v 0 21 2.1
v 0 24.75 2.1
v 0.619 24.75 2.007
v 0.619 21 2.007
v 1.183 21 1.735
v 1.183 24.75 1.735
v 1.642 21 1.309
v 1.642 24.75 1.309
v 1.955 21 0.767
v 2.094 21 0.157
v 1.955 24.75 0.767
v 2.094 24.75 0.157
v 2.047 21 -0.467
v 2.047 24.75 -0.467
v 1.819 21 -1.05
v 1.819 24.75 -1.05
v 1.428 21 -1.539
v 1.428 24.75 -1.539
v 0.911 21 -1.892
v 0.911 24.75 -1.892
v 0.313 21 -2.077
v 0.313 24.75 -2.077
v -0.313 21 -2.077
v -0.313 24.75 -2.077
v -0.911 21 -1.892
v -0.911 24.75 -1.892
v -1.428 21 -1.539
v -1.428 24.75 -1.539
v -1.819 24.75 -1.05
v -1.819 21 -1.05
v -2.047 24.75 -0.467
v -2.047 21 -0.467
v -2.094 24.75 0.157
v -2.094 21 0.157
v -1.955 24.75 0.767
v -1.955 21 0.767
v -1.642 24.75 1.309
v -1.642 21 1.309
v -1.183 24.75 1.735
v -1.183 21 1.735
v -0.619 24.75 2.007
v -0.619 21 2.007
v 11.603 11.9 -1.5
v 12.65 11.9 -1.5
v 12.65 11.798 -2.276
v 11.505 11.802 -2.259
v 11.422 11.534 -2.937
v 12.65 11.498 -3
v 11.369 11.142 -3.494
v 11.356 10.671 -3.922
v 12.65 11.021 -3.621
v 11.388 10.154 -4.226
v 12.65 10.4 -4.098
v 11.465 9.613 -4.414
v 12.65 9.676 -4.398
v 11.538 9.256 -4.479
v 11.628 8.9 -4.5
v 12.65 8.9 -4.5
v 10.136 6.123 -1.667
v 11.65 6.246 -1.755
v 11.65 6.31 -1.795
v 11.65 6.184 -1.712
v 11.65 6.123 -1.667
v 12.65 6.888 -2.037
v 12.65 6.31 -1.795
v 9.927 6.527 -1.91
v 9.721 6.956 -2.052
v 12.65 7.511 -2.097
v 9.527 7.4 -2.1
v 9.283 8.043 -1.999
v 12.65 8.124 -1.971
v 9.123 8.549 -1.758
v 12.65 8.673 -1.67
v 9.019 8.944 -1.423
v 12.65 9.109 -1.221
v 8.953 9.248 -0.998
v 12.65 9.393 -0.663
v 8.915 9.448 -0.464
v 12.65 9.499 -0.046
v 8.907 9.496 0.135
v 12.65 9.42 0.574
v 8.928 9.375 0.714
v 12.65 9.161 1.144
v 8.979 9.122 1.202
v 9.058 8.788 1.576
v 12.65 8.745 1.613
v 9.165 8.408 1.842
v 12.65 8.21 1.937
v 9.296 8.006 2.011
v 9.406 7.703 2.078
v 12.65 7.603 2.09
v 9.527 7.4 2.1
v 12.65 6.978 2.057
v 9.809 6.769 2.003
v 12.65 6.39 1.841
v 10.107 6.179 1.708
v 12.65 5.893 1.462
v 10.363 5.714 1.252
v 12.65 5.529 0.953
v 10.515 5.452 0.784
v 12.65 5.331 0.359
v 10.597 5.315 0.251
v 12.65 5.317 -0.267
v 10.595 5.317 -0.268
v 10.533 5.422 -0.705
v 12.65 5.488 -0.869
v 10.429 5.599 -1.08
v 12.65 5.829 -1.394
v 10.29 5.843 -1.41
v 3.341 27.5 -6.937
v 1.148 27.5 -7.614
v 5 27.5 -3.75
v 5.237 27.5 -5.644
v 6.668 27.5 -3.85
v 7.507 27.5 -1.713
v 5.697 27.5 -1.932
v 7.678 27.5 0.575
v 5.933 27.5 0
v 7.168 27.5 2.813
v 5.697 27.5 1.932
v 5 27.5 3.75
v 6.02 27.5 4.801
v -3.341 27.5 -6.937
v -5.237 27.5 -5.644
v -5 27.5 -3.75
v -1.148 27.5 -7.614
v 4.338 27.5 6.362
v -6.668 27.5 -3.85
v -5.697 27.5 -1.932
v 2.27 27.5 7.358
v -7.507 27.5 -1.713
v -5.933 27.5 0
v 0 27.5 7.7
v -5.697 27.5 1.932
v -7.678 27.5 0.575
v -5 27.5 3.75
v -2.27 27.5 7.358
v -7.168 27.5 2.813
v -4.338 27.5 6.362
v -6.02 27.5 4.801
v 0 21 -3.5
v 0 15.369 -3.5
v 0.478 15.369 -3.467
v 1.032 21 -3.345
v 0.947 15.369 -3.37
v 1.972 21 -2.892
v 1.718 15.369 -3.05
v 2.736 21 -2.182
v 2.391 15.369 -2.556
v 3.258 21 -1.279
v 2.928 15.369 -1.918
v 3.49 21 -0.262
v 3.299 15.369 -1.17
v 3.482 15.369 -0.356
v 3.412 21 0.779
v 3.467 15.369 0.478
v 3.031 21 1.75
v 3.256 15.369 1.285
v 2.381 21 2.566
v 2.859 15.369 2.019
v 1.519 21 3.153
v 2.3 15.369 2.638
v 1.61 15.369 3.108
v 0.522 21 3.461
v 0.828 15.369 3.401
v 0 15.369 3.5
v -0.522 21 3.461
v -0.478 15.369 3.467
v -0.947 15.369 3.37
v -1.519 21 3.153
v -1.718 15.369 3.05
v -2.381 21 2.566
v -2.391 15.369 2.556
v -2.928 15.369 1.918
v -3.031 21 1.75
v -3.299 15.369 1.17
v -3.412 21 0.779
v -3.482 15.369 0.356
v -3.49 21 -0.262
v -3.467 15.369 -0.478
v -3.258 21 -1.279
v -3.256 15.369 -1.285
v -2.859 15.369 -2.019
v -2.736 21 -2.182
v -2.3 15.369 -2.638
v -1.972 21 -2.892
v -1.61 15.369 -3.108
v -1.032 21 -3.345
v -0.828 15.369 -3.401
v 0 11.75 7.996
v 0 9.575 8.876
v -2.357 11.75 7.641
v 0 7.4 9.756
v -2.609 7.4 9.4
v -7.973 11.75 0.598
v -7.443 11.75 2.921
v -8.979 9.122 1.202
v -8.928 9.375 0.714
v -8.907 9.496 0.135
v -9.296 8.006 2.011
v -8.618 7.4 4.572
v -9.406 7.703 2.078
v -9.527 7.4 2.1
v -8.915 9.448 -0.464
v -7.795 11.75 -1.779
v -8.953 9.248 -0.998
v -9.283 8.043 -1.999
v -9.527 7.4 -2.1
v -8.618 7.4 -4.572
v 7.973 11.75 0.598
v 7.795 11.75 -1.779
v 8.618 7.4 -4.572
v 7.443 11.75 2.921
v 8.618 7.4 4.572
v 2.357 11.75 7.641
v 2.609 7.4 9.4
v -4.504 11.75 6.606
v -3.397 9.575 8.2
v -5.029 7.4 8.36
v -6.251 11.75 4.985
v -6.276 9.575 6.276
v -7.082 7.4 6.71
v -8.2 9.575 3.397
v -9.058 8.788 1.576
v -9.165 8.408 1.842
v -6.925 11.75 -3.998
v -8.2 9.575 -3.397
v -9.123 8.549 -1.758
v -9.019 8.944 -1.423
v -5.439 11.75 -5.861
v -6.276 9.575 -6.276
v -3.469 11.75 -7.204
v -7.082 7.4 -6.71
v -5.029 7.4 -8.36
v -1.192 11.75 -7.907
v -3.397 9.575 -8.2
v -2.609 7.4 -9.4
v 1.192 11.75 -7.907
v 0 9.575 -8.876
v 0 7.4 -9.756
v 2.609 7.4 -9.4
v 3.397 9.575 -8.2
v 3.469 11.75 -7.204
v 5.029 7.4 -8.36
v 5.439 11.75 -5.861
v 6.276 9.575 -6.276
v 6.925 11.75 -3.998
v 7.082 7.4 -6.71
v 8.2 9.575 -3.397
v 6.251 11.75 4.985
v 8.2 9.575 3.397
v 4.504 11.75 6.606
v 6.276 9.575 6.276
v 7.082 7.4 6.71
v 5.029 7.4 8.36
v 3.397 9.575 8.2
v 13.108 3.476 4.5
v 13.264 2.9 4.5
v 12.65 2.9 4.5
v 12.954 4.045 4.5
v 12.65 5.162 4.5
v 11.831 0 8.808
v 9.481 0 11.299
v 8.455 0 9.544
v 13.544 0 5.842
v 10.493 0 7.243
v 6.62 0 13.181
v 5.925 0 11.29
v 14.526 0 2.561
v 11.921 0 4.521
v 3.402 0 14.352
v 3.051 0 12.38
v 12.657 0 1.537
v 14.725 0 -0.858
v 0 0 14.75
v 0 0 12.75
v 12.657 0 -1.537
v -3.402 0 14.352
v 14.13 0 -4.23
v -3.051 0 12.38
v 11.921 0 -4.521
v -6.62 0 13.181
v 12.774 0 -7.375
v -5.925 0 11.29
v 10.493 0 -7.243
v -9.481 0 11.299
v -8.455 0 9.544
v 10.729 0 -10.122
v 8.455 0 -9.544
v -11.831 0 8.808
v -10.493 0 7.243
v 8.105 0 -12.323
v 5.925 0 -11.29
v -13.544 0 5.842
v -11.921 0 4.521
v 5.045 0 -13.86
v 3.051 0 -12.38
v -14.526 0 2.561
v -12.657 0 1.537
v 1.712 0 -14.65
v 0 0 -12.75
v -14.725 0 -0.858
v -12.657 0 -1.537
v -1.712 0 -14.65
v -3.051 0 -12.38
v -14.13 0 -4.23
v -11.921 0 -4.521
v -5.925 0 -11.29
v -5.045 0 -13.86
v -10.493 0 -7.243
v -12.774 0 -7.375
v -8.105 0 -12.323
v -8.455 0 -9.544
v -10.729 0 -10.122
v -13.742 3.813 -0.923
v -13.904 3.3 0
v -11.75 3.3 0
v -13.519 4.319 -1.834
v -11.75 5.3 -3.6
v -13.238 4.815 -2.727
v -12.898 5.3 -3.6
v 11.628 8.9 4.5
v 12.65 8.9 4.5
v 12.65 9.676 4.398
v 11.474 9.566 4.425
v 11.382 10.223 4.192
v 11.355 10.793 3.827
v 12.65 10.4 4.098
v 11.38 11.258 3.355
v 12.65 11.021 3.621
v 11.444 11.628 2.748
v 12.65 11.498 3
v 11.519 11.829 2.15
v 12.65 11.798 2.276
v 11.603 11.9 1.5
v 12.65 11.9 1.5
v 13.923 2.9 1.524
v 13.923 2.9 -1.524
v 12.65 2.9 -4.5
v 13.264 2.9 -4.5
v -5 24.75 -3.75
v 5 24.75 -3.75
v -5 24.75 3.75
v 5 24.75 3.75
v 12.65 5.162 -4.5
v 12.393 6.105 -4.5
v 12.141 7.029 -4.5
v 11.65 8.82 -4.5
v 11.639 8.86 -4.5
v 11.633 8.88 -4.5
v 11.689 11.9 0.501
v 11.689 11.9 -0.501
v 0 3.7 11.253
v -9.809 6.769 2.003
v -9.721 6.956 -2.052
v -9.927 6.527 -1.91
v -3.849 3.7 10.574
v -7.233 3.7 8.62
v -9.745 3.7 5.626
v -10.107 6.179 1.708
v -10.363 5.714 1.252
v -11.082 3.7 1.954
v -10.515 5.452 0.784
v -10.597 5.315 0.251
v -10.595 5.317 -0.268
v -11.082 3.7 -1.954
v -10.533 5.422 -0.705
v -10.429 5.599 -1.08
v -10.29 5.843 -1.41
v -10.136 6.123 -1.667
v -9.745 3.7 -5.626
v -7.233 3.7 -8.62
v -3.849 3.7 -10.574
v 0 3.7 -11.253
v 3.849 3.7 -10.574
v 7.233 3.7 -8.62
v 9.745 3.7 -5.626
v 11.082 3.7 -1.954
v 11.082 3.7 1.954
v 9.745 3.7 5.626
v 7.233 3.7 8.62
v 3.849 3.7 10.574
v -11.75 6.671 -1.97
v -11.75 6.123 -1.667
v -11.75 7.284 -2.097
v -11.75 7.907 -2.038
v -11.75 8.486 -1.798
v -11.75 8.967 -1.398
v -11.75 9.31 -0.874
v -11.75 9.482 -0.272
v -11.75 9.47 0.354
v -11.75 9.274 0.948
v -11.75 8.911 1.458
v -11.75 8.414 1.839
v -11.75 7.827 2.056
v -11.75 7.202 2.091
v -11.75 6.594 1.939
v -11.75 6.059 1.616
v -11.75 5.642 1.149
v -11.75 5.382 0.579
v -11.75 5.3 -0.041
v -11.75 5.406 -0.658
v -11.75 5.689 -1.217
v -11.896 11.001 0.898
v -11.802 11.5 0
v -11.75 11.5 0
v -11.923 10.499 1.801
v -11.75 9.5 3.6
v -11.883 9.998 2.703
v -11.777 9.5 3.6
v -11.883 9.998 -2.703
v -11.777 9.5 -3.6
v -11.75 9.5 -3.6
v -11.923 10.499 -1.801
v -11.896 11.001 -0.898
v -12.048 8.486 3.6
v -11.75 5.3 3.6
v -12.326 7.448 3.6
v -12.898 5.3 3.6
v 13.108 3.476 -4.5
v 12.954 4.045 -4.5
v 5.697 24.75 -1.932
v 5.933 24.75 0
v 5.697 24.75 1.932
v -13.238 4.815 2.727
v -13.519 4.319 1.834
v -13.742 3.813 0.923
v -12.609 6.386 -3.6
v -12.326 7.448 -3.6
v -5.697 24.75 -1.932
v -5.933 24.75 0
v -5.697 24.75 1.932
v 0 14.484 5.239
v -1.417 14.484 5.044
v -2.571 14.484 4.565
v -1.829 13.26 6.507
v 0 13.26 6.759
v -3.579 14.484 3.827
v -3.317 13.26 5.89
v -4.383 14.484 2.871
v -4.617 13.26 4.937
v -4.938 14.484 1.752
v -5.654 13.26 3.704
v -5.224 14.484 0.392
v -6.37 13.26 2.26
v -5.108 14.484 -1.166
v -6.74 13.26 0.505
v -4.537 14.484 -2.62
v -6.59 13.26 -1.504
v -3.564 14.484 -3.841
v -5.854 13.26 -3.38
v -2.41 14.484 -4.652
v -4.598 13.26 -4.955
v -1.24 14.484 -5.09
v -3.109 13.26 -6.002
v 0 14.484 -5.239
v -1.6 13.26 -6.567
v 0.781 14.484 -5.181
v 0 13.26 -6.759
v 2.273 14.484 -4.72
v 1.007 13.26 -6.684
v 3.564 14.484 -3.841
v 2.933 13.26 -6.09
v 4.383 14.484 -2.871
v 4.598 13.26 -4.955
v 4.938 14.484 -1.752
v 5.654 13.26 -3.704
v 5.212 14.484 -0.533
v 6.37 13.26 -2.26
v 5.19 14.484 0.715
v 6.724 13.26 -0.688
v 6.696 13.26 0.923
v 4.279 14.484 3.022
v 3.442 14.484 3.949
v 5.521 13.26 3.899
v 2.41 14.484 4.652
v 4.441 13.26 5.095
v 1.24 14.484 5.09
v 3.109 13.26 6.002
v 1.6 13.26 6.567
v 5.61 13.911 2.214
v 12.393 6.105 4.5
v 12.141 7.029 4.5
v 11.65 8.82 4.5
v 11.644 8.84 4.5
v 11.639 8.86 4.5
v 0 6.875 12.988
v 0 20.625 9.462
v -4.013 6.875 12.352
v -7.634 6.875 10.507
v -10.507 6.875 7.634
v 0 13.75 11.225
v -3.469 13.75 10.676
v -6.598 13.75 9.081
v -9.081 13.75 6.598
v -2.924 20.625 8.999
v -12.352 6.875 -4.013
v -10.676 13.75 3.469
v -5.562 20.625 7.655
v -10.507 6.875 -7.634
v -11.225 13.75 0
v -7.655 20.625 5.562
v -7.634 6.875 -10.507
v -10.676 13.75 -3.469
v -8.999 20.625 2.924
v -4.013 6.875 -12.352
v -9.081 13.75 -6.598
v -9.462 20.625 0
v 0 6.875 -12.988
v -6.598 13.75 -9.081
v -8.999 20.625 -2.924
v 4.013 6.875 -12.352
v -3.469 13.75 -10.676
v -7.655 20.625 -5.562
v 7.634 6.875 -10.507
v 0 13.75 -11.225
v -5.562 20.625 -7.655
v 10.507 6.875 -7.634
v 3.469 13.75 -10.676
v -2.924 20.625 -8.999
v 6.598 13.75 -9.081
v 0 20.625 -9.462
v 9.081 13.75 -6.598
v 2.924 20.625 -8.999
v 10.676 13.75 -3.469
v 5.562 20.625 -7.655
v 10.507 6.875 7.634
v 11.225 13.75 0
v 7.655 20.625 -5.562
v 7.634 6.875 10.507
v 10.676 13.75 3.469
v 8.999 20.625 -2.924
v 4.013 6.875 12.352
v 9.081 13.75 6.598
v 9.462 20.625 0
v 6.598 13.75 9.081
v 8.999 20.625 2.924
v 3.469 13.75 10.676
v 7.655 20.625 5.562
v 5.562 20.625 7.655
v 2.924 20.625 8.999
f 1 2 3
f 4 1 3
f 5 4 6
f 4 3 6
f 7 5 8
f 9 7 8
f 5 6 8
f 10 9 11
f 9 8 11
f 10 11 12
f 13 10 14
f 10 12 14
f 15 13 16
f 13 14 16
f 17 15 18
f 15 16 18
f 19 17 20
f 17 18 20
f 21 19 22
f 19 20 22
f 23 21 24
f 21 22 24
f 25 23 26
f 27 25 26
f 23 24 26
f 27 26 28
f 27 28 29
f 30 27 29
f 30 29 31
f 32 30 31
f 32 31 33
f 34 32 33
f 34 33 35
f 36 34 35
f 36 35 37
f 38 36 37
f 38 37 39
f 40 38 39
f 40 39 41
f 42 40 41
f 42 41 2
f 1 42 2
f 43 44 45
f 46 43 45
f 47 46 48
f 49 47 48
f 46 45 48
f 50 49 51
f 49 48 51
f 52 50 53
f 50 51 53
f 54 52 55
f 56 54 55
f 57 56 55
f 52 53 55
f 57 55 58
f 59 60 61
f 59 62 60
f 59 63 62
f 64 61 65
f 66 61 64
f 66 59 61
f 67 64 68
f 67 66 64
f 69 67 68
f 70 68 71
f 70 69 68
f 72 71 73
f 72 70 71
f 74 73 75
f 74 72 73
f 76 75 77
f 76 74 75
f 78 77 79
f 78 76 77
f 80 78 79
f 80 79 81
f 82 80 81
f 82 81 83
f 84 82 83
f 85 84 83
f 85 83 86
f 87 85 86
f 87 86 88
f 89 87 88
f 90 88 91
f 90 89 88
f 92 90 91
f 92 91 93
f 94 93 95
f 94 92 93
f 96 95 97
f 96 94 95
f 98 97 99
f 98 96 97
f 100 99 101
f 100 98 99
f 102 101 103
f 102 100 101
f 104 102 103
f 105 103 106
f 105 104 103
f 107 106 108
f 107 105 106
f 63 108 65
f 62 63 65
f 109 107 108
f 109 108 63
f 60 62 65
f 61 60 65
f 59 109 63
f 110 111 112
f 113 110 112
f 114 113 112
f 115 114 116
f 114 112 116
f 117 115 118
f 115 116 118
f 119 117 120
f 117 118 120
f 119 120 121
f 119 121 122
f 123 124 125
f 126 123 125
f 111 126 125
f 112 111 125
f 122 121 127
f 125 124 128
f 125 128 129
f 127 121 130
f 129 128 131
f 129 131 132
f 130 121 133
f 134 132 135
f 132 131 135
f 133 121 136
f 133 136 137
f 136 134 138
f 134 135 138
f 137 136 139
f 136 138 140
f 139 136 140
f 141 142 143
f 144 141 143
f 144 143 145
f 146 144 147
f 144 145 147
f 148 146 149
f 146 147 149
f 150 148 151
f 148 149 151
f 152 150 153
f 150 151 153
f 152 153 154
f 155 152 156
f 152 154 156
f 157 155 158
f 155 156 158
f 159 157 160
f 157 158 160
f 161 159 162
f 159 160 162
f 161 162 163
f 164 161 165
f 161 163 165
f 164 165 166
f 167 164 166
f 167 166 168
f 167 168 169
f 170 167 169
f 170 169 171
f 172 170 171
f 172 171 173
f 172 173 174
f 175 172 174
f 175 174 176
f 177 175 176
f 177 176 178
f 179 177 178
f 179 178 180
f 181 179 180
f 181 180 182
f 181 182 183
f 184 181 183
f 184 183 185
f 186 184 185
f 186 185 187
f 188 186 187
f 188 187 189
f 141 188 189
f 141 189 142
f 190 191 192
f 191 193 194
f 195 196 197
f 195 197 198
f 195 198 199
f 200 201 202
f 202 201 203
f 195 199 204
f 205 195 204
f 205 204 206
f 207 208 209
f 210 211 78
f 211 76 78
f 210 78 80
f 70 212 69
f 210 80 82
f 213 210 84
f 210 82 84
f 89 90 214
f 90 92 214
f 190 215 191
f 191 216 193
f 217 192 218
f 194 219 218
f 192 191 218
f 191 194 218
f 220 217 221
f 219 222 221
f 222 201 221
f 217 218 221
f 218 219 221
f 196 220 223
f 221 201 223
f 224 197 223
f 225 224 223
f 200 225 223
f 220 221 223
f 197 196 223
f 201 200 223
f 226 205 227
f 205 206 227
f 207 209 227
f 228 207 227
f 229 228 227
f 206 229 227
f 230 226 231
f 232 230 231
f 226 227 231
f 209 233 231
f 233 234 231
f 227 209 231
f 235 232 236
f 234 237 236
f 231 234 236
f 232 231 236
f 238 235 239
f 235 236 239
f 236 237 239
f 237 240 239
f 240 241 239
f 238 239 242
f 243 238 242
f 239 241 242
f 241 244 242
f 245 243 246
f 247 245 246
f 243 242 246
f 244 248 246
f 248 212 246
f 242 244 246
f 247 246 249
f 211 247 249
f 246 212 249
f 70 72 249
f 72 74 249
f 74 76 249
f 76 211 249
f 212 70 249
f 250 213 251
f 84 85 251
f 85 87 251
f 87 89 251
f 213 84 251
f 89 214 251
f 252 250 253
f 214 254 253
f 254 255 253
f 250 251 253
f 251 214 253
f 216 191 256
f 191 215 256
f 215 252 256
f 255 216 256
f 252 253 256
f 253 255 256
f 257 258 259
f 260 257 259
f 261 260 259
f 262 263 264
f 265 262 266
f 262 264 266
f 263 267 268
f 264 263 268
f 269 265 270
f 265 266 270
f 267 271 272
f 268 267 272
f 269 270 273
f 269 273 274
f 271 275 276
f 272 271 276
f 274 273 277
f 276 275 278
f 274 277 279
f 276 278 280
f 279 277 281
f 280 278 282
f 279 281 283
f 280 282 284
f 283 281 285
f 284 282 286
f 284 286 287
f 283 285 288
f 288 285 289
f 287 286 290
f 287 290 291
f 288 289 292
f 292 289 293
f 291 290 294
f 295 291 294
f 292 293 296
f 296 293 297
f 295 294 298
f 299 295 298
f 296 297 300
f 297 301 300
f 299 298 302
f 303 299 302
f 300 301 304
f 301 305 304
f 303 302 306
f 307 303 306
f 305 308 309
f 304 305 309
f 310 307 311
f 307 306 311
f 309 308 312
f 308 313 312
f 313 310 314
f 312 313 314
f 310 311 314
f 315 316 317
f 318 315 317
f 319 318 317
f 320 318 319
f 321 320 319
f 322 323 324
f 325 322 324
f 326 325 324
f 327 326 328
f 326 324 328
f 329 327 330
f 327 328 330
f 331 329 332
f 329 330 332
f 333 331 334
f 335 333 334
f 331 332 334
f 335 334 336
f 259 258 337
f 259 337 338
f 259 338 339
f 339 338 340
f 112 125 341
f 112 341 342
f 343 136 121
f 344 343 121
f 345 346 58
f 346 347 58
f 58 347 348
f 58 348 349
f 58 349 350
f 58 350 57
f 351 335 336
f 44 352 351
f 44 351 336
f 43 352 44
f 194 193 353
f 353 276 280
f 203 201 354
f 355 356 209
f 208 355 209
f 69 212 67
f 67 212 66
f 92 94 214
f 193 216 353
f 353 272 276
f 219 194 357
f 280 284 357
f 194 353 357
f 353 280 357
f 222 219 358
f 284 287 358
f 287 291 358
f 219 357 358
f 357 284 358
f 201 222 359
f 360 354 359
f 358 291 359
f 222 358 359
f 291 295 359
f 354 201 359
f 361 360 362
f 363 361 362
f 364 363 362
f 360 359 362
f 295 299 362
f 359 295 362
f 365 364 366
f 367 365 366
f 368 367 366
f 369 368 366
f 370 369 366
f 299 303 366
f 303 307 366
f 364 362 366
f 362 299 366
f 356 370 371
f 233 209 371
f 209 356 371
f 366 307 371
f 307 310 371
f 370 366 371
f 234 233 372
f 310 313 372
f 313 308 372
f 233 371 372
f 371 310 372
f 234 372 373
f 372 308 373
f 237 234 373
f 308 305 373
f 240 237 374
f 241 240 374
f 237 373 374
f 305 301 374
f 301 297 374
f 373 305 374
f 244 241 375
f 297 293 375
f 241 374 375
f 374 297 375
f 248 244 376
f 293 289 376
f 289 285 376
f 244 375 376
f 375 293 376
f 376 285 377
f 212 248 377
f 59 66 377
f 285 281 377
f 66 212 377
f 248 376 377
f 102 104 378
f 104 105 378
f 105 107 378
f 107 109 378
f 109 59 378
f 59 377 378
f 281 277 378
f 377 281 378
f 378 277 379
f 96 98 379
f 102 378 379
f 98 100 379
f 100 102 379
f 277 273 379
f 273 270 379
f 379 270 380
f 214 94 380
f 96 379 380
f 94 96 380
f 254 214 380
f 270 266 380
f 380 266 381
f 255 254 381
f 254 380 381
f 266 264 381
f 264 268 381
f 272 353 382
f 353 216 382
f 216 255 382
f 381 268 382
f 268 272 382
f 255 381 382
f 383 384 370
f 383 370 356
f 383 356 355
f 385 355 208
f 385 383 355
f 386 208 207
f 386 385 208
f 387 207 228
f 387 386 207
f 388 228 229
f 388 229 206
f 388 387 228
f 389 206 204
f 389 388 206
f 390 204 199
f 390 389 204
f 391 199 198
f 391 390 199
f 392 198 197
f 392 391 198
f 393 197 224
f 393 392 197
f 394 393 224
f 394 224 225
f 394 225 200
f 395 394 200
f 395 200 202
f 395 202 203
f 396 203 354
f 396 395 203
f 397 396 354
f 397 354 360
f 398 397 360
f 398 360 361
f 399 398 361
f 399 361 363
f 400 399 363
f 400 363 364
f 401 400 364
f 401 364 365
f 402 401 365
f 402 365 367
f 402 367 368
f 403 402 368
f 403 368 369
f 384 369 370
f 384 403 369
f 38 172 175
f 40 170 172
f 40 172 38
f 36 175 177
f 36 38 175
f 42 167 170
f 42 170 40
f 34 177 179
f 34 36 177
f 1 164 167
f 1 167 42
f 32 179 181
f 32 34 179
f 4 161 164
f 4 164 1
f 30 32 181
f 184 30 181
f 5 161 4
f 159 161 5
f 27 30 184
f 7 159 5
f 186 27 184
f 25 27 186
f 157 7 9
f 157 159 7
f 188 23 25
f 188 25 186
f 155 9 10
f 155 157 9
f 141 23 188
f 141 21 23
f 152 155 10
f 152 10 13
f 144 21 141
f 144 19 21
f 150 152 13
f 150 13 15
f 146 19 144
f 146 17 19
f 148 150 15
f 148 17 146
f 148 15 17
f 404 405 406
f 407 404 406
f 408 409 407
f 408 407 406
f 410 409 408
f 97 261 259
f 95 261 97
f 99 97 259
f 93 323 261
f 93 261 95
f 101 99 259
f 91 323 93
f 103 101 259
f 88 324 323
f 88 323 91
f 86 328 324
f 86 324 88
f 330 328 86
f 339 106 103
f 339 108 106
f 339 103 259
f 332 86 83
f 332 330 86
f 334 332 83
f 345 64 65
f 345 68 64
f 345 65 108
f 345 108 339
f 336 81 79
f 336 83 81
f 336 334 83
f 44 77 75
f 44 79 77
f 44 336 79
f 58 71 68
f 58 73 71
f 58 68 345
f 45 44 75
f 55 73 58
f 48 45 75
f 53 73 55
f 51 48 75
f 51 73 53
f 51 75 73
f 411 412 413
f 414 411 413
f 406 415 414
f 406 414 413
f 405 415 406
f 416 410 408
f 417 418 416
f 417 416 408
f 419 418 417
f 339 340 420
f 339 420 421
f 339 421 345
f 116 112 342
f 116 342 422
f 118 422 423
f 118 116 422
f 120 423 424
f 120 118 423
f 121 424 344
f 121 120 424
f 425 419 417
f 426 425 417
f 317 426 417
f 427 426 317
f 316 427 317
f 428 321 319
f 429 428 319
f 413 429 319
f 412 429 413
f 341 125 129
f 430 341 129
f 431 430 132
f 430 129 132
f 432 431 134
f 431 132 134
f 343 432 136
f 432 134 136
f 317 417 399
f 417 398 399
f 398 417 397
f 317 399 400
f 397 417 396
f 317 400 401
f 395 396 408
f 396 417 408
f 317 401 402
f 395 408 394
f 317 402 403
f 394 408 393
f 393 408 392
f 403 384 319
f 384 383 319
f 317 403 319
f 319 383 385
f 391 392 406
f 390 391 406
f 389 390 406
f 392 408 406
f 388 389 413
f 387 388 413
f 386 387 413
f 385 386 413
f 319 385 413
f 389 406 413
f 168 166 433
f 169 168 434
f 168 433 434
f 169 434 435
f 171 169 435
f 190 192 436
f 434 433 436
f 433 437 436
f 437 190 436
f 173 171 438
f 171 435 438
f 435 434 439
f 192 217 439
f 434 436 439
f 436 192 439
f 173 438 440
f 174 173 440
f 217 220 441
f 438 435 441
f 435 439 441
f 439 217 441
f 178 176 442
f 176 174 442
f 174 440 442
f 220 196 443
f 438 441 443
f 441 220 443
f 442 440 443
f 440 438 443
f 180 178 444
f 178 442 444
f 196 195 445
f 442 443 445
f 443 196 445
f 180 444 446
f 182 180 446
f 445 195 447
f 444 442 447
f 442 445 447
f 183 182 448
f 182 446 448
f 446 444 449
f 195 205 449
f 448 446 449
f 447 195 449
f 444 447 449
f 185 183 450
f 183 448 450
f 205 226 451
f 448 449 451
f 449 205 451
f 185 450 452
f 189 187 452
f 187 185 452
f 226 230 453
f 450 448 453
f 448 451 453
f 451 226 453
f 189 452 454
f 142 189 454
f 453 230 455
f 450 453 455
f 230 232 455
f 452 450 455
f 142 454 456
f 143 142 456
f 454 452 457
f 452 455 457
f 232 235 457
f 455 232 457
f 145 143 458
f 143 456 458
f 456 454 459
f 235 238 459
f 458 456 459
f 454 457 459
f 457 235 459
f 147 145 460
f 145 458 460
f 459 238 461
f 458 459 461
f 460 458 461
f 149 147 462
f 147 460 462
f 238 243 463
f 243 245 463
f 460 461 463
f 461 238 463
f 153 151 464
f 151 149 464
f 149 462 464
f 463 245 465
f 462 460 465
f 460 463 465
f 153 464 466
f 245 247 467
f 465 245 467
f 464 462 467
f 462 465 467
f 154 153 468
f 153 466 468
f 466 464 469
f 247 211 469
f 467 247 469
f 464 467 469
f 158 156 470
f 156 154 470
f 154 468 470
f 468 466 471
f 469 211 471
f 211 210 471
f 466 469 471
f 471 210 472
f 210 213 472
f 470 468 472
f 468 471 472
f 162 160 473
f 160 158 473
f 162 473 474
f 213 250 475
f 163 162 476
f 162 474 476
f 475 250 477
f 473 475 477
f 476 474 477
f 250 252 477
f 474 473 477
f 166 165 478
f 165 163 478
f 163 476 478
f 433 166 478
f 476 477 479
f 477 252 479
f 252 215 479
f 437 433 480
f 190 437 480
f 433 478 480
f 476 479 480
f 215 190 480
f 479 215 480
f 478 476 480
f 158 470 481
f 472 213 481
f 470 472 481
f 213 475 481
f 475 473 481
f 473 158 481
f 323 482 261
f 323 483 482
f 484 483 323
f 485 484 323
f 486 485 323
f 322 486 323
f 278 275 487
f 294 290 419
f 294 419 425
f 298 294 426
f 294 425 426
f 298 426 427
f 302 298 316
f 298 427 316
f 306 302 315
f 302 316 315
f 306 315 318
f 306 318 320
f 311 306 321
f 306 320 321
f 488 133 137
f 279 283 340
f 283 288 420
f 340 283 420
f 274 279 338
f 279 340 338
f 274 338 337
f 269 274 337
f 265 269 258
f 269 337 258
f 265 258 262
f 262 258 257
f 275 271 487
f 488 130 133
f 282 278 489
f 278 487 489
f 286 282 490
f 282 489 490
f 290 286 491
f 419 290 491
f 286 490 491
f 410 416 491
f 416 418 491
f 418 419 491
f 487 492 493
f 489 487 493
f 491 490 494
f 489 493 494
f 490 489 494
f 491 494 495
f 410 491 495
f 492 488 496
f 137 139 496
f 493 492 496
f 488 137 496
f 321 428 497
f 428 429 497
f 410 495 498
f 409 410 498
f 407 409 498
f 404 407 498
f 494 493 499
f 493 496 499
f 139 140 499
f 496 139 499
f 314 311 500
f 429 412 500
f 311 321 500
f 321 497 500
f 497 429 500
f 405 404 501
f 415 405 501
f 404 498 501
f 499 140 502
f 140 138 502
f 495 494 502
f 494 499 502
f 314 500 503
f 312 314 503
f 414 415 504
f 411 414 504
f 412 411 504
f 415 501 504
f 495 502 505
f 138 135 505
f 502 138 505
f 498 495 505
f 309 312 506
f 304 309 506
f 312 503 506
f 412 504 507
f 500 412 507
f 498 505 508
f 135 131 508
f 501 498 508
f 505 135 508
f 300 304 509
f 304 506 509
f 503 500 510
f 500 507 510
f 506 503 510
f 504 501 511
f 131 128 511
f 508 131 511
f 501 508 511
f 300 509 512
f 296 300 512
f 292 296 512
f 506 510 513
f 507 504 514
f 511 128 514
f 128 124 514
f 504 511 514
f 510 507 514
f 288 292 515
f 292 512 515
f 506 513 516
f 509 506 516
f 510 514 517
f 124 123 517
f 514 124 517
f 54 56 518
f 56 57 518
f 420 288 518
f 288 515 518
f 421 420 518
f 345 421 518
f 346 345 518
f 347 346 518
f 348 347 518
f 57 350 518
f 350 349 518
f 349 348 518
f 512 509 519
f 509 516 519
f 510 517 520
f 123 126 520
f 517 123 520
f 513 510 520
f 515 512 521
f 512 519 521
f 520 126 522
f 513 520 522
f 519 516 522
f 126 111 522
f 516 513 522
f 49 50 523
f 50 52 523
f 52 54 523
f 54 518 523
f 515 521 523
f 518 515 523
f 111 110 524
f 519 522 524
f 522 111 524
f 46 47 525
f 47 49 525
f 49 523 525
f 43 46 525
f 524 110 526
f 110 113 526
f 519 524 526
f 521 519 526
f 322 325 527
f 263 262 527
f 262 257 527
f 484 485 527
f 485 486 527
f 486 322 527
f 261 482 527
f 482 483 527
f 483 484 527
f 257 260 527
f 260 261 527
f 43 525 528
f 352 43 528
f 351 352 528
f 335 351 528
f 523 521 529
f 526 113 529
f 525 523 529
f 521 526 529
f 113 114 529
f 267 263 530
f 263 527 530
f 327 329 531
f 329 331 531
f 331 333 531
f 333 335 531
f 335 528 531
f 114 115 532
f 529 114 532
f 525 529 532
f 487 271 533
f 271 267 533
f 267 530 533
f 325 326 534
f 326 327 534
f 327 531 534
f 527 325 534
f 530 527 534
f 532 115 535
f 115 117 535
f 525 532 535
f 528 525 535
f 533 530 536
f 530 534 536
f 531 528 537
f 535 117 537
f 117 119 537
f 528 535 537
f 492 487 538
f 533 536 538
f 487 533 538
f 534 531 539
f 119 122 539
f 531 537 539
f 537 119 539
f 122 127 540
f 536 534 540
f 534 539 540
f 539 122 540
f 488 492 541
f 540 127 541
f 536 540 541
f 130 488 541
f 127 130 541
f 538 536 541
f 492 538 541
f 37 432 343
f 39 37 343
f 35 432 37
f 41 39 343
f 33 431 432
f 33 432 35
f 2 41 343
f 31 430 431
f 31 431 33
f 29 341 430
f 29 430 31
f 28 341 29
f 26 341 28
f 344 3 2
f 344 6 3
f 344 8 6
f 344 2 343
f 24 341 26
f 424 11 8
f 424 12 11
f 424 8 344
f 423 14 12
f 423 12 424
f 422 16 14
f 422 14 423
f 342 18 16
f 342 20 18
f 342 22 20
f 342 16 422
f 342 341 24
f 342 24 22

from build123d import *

# Parameters (mm, degrees)
CUT_EXTRUDE1_DEPTH      = 18
CUT_EXTRUDE1_DEPTH_BACK = 18
SKETCH2_R               = 2.1
SKETCH3_W               = 9
SKETCH3_H               = 9
CUT_EXTRUDE4_DEPTH      = 3.1
SKETCH4_W               = 9
SKETCH4_H               = 9
SKETCH4_R               = 2.1
BOSS_EXTRUDE2_DEPTH     = 1
BOSS_EXTRUDE3_START     = -1.850787983
BOSS_EXTRUDE3_DEPTH     = 0.850787983
FILLET2_R               = 3
CUT_EXTRUDE5_DEPTH      = 3
SKETCH9_W               = 10
SKETCH9_H               = 7.5
SKETCH9_R               = 2.1
CUT_EXTRUDE6_DEPTH      = 2.75
SKETCH10_R              = 2.1
CUT_EXTRUDE7_DEPTH      = 37.75
SKETCH11_R              = 3.5
CUT_EXTRUDE8_DEPTH      = 17
SKETCH12_R              = 3.5
CUT_EXTRUDE9_DEPTH      = 4


# Read off the part's stored shape, not the designer's step: Boss-Extrude3
with BuildPart() as part:
    # Sketch1 → Revolve2 (revolve)
    with BuildSketch(Plane.XY, mode=Mode.PRIVATE) as revolve2_sk:
        with BuildLine():
            Line((0, 27.5), (0, 16))
            ThreePointArc((0, 16), (4.539948066, 14.894753), (7.995845625, 11.75))
            Line((7.995845625, 11.75), (9.755894266, 7.4))
            Line((9.755894266, 7.4), (12.75, 0))
            Line((12.75, 0), (14.75, 0))
            Line((14.75, 0), (7.7, 27.5))
            Line((7.7, 27.5), (0, 27.5))
        make_face()
    revolve(revolve2_sk.sketch.rotate(Axis((0, 27.5, 0), (0, -1, 0)), 90), axis=Axis((0, 27.5, 0), (0, -1, 0)))

    # Sketch2 → Cut-Extrude1 (cut, two sides: drawn at the far end of the back side and taken through both)
    with BuildSketch(Plane(origin=(0, 0, 0), x_dir=(0, 0, -1), z_dir=(1, 0, 0)).offset(-CUT_EXTRUDE1_DEPTH_BACK)):
        with Locations(Location((0, 7.4, 0), (0, 0, 322.555636433))):
            Circle(SKETCH2_R)
    extrude(amount=CUT_EXTRUDE1_DEPTH + CUT_EXTRUDE1_DEPTH_BACK, mode=Mode.SUBTRACT)

    # Sketch3 → Cut-Extrude4 (cut)
    with BuildSketch(Plane(origin=(14.75, 0, 0), x_dir=(0, 0, -1), z_dir=(1, 0, 0))):
        with Locations((0, 7.4)):
            Rectangle(SKETCH3_W, SKETCH3_H)
    extrude(amount=-CUT_EXTRUDE4_DEPTH, mode=Mode.SUBTRACT)

    # Sketch4 → Boss-Extrude2 (add)
    with BuildSketch(Plane(origin=(11.65, 0, 0), x_dir=(0, 0, -1), z_dir=(1, 0, 0))):
        with Locations((0, 7.4)):
            Rectangle(SKETCH4_W, SKETCH4_H)
        with Locations(Location((0, 7.4, 0), (0, 0, 328.733960859))):
            Circle(SKETCH4_R, mode=Mode.SUBTRACT)
    extrude(amount=BOSS_EXTRUDE2_DEPTH)

    # Boss-Extrude3 outline → Boss-Extrude3 (add)
    with BuildSketch(Plane(origin=(12.65, 0, 0), x_dir=(0, 0, -1), z_dir=(1, 0, 0)).offset(BOSS_EXTRUDE3_START)):
        with BuildLine():
            Line((1.769303732, 8.531178281), (4.5, 8.531178281))
            Line((4.5, 8.531178281), (4.5, 11.9))
            Line((4.5, 11.9), (-4.5, 11.9))
            Line((-4.5, 11.9), (-4.5, 8.531178281))
            Line((-4.5, 8.531178281), (-1.769303732, 8.531178281))
            ThreePointArc((-1.769303732, 8.531178281), (0, 9.5), (1.769303732, 8.531178281))
        make_face()
    extrude(amount=BOSS_EXTRUDE3_DEPTH)

    # Fillet2
    fillet2_edges = [part.edges().sort_by_distance(p)[0] for p in [
        (11.724606008, 11.9, -4.5),
        (11.724606008, 11.9, 4.5),
    ]]
    fillet(fillet2_edges, radius=FILLET2_R)

    # Sketch8 → Cut-Extrude5 (cut)
    with BuildSketch(Plane(origin=(-14.75, 0, 0), x_dir=(0, 0, -1), z_dir=(1, 0, 0))):
        Polygon((3.6, 5.3), (3.6, 9.5), (0, 11.5), (-3.6, 9.5), (-3.6, 5.3), (0, 3.3), align=None)
    extrude(amount=CUT_EXTRUDE5_DEPTH, mode=Mode.SUBTRACT)

    # Sketch9 → Cut-Extrude6 (cut)
    # profile 1 of 3: a face of its own
    with BuildSketch(Plane(origin=(0, 27.5, 0), x_dir=(1, 0, 0), z_dir=(0, 1, 0))):
        with BuildLine():
            Line((-5, -3.75), (-5, 3.75))
            ThreePointArc((-5, 3.75), (-5.933352987, 0), (-5, -3.75))
        make_face()
    # profile 2 of 3: a face of its own
    with BuildSketch(Plane(origin=(0, 27.5, 0), x_dir=(1, 0, 0), z_dir=(0, 1, 0))):
        Rectangle(SKETCH9_W, SKETCH9_H)
        with Locations(Location((0, 0, 0), (0, 0, 270))):
            Circle(SKETCH9_R, mode=Mode.SUBTRACT)
    # profile 3 of 3: a face of its own
    with BuildSketch(Plane(origin=(0, 27.5, 0), x_dir=(1, 0, 0), z_dir=(0, 1, 0))):
        with BuildLine():
            ThreePointArc((5, 3.75), (5.933352987, 0), (5, -3.75))
            Line((5, -3.75), (5, 3.75))
        make_face()
    extrude(amount=-CUT_EXTRUDE6_DEPTH, mode=Mode.SUBTRACT)

    # Sketch10 → Cut-Extrude7 (cut)
    with BuildSketch(Plane(origin=(0, 27.5, 0), x_dir=(1, 0, 0), z_dir=(0, 1, 0))):
        with Locations(Location((0, 0, 0), (0, 0, 270))):
            Circle(SKETCH10_R)
    extrude(amount=-CUT_EXTRUDE7_DEPTH, mode=Mode.SUBTRACT)

    # Sketch11 → Cut-Extrude8 (cut)
    with BuildSketch(Plane(origin=(0, 0, 0), x_dir=(-1, 0, 0), z_dir=(0, -1, 0))):
        with Locations(Location((0, 0, 0), (0, 0, 90))):
            Circle(SKETCH11_R)
    extrude(amount=-CUT_EXTRUDE8_DEPTH, mode=Mode.SUBTRACT)

    # Sketch12 → Cut-Extrude9 (cut)
    with BuildSketch(Plane(origin=(0, 17, 0), x_dir=(-1, 0, 0), z_dir=(0, -1, 0))):
        with Locations(Location((0, 0, 0), (0, 0, 90))):
            Circle(SKETCH12_R)
    extrude(amount=-CUT_EXTRUDE9_DEPTH, mode=Mode.SUBTRACT)


solid = part.part
